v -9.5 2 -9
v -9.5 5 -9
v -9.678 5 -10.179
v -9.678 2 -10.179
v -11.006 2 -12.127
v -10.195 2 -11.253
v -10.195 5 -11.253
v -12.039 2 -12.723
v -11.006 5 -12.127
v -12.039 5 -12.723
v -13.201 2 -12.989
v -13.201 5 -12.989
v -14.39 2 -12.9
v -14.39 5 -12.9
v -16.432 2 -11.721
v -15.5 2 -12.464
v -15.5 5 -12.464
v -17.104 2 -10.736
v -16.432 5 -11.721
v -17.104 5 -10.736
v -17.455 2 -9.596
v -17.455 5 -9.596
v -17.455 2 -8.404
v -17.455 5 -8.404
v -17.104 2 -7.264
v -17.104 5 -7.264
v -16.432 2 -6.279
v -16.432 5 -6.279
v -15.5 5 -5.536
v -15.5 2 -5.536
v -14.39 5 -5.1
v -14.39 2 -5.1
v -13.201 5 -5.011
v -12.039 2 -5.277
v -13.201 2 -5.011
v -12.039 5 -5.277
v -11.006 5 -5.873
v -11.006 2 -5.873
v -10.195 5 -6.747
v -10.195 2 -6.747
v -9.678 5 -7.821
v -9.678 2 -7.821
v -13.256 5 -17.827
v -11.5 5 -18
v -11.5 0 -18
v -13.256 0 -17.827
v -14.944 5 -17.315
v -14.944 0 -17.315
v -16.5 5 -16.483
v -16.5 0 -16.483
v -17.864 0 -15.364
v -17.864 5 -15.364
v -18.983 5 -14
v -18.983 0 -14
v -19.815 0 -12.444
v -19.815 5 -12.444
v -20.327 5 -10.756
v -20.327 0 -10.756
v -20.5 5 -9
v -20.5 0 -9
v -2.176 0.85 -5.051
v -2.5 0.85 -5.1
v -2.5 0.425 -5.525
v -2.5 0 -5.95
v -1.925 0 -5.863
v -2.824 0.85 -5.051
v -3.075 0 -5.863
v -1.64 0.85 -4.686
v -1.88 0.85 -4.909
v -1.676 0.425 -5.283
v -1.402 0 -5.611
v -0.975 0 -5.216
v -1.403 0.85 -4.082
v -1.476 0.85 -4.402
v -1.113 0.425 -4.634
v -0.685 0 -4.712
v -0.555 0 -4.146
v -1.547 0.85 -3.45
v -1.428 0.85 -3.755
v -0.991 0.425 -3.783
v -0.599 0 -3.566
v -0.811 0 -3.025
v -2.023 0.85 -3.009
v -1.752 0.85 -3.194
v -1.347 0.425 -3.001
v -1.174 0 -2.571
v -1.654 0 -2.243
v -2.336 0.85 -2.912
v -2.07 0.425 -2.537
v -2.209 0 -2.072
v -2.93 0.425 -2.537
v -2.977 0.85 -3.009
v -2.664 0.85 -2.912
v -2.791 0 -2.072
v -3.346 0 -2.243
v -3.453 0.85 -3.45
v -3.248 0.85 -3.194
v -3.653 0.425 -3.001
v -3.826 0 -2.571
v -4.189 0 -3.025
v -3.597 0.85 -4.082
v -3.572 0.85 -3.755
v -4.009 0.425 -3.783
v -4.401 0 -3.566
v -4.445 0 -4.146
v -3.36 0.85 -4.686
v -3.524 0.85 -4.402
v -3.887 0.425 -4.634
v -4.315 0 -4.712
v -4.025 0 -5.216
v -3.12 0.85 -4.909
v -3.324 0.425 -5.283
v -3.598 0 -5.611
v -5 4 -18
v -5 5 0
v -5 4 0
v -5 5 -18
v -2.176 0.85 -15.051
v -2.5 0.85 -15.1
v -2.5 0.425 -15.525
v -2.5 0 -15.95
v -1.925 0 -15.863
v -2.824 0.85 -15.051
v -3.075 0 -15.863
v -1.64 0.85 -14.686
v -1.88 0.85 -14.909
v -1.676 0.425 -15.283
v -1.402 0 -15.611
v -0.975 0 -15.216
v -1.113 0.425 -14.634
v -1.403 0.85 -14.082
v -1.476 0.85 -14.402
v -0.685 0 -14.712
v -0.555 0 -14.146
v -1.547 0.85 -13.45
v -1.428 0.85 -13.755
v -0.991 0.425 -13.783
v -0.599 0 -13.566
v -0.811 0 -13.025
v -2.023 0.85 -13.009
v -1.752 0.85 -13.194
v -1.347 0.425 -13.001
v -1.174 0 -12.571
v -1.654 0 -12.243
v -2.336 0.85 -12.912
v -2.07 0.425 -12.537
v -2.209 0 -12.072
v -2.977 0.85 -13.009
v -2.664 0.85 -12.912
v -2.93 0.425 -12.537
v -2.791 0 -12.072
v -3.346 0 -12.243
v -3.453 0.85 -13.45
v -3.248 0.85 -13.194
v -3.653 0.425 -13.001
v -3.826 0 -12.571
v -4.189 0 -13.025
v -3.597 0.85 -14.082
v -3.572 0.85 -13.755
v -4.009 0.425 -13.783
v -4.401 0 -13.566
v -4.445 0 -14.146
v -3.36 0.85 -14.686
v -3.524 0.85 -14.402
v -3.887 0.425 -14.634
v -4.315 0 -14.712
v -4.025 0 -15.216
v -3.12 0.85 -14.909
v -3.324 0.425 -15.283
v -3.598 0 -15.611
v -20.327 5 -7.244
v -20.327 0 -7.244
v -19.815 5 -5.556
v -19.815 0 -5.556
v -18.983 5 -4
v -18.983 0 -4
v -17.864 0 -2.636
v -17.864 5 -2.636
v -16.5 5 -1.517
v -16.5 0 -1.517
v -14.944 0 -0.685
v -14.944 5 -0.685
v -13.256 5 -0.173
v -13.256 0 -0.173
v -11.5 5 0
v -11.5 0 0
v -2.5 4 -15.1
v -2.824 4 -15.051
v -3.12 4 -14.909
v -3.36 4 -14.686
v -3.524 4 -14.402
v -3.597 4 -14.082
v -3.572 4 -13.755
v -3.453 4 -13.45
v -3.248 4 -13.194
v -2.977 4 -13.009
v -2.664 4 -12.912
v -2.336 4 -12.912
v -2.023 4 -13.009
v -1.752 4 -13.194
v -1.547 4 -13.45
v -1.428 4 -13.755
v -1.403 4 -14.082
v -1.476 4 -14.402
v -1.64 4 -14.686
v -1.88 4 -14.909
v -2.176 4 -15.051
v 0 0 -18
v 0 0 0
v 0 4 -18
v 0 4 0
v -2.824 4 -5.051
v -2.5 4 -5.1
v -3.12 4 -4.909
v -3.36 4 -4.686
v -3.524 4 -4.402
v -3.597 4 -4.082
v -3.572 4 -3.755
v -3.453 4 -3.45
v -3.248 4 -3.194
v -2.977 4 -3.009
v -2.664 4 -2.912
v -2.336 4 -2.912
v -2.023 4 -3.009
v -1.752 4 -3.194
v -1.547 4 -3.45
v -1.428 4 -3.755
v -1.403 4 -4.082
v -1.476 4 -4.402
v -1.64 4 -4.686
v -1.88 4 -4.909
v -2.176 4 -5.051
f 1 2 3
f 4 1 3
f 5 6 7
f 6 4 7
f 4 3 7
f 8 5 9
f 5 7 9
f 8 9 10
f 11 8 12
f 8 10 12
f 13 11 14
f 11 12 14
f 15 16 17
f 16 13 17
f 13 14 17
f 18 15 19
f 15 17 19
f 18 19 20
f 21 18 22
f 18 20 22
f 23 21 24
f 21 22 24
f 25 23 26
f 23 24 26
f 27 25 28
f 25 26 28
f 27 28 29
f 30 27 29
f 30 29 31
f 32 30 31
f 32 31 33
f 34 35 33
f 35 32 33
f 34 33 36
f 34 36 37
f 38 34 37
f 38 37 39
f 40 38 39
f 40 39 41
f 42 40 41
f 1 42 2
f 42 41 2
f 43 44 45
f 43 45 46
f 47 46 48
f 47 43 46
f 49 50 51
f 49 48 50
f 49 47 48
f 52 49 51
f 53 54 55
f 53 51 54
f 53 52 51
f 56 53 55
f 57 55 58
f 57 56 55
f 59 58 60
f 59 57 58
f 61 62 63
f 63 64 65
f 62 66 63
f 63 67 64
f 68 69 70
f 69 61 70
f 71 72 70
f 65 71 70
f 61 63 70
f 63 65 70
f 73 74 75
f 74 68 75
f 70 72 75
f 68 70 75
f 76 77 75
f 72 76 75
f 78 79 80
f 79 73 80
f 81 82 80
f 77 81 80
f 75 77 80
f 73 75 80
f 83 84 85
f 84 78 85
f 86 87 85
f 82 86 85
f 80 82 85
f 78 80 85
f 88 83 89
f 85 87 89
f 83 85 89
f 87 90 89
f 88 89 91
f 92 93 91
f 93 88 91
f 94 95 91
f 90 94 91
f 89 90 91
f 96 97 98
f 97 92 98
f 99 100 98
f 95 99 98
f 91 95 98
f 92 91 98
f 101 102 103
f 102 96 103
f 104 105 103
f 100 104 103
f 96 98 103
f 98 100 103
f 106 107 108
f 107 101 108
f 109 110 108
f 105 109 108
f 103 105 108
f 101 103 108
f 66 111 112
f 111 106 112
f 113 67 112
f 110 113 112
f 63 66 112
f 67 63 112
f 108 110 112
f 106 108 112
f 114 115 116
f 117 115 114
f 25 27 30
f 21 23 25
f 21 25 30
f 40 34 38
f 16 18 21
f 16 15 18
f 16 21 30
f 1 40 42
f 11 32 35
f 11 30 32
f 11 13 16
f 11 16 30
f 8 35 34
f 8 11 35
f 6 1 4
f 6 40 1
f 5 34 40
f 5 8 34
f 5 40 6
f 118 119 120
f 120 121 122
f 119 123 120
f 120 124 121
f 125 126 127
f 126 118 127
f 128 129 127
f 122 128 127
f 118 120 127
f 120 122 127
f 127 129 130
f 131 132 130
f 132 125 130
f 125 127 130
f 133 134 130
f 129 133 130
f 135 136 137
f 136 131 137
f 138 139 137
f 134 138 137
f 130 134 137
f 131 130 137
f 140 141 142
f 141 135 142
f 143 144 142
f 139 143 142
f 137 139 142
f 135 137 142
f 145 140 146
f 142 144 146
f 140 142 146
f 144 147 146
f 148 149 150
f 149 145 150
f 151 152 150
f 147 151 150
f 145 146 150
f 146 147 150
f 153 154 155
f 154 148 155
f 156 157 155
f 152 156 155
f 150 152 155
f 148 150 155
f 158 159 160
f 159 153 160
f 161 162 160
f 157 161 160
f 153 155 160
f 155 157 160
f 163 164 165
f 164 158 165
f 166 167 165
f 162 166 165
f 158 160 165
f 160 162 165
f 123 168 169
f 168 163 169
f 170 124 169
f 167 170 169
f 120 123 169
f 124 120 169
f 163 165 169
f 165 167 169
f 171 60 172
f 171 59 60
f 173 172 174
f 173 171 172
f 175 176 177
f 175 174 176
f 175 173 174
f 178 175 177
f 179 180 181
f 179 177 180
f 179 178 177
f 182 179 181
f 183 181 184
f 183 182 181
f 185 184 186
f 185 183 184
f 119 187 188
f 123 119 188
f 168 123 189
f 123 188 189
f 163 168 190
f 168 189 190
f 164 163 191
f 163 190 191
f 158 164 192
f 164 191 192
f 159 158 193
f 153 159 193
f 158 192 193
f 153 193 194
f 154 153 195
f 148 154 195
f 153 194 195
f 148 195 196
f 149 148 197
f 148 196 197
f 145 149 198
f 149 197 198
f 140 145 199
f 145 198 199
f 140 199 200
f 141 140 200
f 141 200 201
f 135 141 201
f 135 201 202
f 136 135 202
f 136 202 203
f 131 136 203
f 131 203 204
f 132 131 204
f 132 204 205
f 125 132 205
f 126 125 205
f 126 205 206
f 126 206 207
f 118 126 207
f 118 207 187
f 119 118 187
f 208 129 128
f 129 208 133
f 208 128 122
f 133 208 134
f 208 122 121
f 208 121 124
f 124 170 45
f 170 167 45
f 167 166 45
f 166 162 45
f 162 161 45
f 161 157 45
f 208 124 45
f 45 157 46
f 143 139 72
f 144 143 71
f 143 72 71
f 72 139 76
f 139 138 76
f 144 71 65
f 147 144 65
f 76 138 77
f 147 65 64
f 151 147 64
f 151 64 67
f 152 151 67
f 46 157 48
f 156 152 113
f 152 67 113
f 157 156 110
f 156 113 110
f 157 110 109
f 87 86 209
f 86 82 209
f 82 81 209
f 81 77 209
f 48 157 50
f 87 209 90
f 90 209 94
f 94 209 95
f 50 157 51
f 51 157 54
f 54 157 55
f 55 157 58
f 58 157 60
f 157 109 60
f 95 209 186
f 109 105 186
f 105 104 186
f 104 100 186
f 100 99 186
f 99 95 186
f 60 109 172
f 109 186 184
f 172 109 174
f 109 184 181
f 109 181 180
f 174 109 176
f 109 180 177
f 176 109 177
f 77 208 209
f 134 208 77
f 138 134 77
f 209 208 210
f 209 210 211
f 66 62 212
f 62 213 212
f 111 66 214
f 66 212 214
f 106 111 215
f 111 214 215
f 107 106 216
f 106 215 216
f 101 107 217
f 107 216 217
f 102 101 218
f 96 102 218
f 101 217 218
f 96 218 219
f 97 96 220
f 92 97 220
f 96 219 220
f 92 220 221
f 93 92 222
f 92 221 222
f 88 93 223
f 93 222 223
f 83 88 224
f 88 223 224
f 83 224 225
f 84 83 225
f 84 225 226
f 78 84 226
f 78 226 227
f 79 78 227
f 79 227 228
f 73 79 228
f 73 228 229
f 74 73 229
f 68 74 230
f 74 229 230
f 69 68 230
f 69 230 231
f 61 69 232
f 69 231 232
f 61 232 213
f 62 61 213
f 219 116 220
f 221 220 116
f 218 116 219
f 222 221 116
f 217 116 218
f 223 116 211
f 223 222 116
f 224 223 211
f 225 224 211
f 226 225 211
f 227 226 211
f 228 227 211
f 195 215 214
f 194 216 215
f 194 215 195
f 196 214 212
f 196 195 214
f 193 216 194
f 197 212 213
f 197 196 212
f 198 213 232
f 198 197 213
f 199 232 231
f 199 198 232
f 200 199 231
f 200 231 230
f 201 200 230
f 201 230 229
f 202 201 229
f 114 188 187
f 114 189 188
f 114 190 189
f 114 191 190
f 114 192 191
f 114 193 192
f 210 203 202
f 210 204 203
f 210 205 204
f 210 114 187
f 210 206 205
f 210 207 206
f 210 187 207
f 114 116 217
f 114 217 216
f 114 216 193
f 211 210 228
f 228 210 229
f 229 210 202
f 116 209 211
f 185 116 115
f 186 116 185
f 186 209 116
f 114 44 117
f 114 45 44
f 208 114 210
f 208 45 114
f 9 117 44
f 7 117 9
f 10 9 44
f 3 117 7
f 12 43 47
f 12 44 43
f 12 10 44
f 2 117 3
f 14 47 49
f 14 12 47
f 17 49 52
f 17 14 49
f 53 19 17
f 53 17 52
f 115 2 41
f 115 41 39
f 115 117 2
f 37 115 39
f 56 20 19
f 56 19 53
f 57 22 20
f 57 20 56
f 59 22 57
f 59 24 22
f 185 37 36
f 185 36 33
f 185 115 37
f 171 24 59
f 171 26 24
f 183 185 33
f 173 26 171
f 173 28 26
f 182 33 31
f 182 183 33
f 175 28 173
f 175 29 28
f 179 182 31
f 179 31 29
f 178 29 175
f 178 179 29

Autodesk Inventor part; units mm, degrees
ref_plane "YZ Plane" through (0, 0, 0) normal (1, 0, 0) x (0, 1, 0)
ref_plane "XZ Plane" through (0, 0, 0) normal (0, 1, 0) x (-1, 0, 0)
ref_plane "XY Plane" through (0, 0, 0) normal (0, 0, 1) x (1, 0, 0)
sketch "Эскиз1" plane through (0, 0, 0) normal (0, 1, 0) x (-1, 0, 0)
  line L0 (0, 0) -> (20.5, 0)
  line L1 (20.5, 0) -> (20.5, -18)
  line L2 (20.5, -18) -> (0, -18)
  line L3 (0, -18) -> (0, 0)
  dimension "d0" = 20.5
  dimension "d1" = 18
extrude "Выдавливание1" add sketch "Эскиз1" along normal blind 5
sketch "Эскиз2" plane through (0, 5, 0) normal (0, 1, 0) x (1, 0, 0)
  line L0 (-20.5, 18) -> (-20.5, 0) projected
  line L1 (-20.5, 9) -> (-13.5, 9)
  circle A0 centre (-13.5, 9) radius 4
  point P0 (0, 0)
  dimension "d4" = 7
  dimension "d5" = 8
extrude "Выдавливание2" cut sketch "Эскиз2" against normal blind 3
fillet "Сопряжение1" radius 9 2 edges at (-20.5, 2.5, 0) (-20.5, 2.5, -18)
sketch "Эскиз3" plane through (0, 0, 0) normal (0, -1, 0) x (1, 0, 0)
  line L0 (0, 0) -> (0, -18) projected
  line L1 (0, -9) -> (-2.5, -9)
  line L2 (-2.5, -4) -> (-2.5, -14)
  dimension "d9" = 2.5
  dimension "d10" = 10
hole "Отверстие1" at (-2.5, 0, -4) at (-2.5, 0, -14) direction (0, 1, 0) diameter 2.2 end through all countersink diameter 3.9 countersink angle 90
sketch "Эскиз4" plane through (0, 5, 0) normal (0, 1, 0) x (1, 0, 0)
  line L0 (0, 0) -> (-5, 0)
  line L1 (-5, 0) -> (-5, 18)
  line L2 (-5, 18) -> (0, 18)
  line L3 (0, 18) -> (0, 0)
  line L4 (0, 18) -> (-11.5, 18) projected
  dimension "d18" = 5
extrude "Выдавливание3" cut sketch "Эскиз4" against normal blind 1
properties part number "Деталь основы рулевого управления"
